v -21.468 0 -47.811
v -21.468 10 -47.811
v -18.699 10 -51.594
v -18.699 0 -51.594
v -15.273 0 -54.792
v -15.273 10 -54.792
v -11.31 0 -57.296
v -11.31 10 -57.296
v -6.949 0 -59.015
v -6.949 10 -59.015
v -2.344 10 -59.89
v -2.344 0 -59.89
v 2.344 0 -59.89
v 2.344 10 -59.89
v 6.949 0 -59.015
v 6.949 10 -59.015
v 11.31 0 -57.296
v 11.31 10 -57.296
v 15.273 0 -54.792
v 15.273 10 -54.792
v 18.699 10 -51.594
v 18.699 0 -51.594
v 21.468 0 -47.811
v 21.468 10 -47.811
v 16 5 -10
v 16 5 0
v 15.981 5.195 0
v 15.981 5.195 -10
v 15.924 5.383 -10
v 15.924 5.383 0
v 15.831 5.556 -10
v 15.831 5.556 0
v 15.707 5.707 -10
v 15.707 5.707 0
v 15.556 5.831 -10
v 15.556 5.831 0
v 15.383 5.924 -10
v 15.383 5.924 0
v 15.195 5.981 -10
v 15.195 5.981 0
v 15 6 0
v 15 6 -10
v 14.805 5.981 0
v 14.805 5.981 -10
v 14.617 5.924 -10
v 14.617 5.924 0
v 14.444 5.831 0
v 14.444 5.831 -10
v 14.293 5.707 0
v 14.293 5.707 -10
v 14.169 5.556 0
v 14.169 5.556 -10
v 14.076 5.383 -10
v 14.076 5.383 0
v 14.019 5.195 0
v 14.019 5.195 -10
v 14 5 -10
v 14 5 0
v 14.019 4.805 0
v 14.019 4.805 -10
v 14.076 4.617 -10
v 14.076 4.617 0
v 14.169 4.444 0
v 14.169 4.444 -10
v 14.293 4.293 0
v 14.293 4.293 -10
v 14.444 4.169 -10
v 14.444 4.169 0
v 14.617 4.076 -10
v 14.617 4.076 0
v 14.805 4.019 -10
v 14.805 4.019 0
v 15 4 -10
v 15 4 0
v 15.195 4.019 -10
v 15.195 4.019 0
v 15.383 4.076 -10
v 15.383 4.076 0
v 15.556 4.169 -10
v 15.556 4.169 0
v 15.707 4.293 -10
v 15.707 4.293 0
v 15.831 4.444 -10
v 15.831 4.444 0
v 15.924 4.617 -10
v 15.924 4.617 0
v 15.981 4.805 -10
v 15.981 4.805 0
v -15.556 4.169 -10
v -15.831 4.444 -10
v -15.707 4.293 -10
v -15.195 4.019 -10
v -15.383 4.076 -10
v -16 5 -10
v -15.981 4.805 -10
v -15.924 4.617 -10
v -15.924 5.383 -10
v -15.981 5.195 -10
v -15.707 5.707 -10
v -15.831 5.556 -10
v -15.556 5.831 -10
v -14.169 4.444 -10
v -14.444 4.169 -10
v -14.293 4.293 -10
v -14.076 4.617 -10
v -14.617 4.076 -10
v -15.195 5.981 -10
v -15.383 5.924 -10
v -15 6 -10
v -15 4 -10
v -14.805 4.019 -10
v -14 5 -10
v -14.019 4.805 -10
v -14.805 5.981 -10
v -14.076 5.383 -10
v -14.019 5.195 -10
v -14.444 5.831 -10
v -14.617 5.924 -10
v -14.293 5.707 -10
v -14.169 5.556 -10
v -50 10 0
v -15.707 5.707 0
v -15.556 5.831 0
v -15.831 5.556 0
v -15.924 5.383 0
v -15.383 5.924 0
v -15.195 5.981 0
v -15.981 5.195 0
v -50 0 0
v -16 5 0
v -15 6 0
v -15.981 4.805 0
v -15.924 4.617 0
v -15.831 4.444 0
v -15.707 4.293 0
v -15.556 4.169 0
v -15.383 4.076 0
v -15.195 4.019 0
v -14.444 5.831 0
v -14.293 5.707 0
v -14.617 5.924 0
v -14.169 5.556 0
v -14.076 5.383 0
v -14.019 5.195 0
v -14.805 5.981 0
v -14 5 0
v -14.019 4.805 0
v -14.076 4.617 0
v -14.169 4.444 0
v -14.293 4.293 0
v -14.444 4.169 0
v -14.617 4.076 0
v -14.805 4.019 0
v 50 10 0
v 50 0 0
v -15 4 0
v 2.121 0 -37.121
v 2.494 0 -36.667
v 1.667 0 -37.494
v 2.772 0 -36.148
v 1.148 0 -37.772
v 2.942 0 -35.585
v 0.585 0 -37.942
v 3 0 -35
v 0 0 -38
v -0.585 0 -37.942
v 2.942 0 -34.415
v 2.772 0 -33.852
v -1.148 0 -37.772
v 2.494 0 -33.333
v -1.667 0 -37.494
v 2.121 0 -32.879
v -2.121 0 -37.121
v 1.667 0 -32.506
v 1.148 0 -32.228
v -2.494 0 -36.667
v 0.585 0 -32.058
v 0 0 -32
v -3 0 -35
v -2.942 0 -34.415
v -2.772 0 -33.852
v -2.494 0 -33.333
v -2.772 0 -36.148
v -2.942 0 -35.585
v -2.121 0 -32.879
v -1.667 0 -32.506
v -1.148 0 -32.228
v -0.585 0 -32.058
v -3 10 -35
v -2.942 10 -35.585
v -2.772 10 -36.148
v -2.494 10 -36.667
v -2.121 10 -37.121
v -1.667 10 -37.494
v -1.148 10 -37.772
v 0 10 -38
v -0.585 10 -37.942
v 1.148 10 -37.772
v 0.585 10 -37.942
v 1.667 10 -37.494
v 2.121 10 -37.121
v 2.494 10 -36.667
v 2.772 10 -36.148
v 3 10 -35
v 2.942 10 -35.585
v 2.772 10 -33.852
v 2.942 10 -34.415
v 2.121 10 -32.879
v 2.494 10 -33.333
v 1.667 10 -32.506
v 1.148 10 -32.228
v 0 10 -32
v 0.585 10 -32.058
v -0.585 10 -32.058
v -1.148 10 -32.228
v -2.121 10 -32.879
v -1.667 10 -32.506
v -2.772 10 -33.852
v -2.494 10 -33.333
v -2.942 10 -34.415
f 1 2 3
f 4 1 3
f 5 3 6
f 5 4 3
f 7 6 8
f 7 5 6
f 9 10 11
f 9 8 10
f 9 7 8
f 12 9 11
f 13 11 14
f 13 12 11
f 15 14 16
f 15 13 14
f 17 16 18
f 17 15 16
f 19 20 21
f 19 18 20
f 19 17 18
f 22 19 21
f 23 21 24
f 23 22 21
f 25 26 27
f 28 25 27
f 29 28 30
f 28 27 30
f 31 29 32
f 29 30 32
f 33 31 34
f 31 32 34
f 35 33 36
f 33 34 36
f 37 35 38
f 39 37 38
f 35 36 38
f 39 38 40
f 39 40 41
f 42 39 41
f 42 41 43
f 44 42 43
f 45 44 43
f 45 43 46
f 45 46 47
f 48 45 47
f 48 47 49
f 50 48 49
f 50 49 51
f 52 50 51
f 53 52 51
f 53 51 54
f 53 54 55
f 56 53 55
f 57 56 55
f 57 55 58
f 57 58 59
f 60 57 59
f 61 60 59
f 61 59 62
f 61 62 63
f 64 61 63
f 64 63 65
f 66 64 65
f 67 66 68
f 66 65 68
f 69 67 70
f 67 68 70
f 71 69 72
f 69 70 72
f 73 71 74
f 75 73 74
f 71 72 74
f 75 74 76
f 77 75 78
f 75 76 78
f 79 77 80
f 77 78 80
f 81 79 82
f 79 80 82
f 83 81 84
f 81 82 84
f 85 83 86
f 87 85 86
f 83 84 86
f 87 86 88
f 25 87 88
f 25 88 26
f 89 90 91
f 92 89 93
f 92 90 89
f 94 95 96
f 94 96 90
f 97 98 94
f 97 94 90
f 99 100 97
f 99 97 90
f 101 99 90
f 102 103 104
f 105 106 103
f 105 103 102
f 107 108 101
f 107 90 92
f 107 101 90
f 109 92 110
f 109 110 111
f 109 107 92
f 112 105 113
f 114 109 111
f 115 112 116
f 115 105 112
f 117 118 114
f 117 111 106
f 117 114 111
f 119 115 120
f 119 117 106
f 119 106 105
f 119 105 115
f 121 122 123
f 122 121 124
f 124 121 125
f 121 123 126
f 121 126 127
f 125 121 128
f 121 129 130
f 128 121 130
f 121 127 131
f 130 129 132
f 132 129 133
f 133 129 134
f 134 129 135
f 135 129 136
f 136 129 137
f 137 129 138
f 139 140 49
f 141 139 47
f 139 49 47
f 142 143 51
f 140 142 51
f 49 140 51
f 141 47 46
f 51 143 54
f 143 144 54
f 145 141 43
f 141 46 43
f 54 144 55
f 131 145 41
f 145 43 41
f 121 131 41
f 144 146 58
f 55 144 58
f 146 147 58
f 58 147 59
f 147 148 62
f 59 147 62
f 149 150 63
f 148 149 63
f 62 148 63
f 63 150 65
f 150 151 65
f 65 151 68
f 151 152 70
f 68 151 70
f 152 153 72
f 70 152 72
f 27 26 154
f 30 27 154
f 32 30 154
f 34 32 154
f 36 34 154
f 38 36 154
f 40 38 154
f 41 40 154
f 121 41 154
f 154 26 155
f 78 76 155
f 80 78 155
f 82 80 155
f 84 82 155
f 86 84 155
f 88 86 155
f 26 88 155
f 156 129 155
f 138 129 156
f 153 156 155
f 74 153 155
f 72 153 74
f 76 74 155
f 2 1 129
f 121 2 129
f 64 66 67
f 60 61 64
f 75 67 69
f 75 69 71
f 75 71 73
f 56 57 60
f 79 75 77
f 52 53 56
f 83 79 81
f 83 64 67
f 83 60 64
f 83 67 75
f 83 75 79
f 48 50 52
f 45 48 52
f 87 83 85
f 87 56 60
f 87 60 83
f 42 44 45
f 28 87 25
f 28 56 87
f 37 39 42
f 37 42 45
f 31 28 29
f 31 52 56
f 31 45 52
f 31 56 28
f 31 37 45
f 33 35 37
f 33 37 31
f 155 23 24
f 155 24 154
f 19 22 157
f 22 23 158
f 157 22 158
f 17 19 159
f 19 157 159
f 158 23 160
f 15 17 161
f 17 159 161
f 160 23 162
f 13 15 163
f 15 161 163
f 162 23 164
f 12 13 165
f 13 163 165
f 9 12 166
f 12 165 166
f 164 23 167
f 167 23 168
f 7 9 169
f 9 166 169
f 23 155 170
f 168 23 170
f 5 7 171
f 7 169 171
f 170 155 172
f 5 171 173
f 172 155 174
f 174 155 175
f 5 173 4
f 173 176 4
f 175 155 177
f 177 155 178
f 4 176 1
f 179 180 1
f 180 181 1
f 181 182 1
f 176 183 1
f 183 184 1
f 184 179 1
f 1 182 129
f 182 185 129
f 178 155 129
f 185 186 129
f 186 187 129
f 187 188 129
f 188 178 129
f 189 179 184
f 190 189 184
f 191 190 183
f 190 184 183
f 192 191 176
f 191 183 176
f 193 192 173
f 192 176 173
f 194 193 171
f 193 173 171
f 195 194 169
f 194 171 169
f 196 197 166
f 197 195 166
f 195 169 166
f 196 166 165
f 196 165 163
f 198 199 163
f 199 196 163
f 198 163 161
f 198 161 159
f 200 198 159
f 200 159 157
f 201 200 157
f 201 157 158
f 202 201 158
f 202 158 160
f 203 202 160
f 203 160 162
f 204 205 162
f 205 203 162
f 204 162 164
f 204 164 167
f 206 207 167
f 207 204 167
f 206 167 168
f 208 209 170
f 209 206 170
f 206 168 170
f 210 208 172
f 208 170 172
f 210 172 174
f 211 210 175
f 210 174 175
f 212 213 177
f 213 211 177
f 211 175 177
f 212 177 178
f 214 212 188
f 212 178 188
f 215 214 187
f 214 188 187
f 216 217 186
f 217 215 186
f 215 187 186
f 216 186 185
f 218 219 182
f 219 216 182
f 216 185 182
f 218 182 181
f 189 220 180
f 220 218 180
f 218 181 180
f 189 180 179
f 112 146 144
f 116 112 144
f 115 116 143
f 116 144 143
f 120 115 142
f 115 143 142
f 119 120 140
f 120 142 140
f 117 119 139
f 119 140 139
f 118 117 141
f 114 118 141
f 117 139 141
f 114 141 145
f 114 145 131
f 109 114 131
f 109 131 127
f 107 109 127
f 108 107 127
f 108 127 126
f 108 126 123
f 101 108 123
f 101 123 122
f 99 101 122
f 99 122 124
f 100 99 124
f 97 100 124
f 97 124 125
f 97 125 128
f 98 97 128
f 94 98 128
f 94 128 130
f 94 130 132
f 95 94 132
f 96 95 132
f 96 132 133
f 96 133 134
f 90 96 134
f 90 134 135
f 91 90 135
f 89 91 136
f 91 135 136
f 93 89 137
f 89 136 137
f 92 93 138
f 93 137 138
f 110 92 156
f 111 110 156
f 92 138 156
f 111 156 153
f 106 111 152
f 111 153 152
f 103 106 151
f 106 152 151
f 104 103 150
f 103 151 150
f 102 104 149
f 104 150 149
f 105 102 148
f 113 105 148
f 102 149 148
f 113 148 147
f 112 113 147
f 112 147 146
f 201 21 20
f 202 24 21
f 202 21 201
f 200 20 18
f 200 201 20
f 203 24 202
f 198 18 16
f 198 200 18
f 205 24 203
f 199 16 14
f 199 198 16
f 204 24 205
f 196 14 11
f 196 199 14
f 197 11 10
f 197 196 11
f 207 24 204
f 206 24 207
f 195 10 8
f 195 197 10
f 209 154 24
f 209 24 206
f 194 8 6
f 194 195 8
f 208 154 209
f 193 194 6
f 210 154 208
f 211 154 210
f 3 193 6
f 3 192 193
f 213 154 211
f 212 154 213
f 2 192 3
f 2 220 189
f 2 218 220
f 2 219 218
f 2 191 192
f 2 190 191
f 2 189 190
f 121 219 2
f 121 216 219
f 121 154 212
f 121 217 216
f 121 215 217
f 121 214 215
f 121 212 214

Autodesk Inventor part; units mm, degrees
ref_plane "YZ Plane" through (0, 0, 0) normal (1, 0, 0) x (0, 1, 0)
ref_plane "XZ Plane" through (0, 0, 0) normal (0, 1, 0) x (-1, 0, 0)
ref_plane "XY Plane" through (0, 0, 0) normal (0, 0, 1) x (1, 0, 0)
sketch "Sketch1" plane through (0, 0, 0) normal (0, 1, 0) x (-1, 0, 0)
  circle A0 centre (0, -35) radius 25
  line L0 (0, 0) -> (50, 0)
  line L1 (50, 0) -> (-50, 0)
  line L2 (21.4679, -47.8113) -> (50, 0)
  line L3 (-21.4679, -47.8113) -> (-50, 0)
  circle A1 centre (0, -35) radius 3
  dimension "d4" = 50
  dimension "d5" = 50
  dimension "d6" = 100
  dimension "d7" = 6
extrude "Extrusion1" add sketch "Sketch1" along normal blind 10
sketch "Sketch2" plane through (-50, 0, 0) normal (0, 0, 1) x (1, 0, 0)
  line L0 (0, 10) -> (100, 10) projected
  line L1 (0, 10) -> (50, 10)
  line L2 (50, 10) -> (50, 0)
  circle A0 centre (35, 5) radius 1
  circle A1 centre (65, 5) radius 1
  dimension "d11" = 2
  dimension "d12" = 2
extrude "Extrusion2" cut sketch "Sketch2" against normal blind 10
properties part number "stojan2"
